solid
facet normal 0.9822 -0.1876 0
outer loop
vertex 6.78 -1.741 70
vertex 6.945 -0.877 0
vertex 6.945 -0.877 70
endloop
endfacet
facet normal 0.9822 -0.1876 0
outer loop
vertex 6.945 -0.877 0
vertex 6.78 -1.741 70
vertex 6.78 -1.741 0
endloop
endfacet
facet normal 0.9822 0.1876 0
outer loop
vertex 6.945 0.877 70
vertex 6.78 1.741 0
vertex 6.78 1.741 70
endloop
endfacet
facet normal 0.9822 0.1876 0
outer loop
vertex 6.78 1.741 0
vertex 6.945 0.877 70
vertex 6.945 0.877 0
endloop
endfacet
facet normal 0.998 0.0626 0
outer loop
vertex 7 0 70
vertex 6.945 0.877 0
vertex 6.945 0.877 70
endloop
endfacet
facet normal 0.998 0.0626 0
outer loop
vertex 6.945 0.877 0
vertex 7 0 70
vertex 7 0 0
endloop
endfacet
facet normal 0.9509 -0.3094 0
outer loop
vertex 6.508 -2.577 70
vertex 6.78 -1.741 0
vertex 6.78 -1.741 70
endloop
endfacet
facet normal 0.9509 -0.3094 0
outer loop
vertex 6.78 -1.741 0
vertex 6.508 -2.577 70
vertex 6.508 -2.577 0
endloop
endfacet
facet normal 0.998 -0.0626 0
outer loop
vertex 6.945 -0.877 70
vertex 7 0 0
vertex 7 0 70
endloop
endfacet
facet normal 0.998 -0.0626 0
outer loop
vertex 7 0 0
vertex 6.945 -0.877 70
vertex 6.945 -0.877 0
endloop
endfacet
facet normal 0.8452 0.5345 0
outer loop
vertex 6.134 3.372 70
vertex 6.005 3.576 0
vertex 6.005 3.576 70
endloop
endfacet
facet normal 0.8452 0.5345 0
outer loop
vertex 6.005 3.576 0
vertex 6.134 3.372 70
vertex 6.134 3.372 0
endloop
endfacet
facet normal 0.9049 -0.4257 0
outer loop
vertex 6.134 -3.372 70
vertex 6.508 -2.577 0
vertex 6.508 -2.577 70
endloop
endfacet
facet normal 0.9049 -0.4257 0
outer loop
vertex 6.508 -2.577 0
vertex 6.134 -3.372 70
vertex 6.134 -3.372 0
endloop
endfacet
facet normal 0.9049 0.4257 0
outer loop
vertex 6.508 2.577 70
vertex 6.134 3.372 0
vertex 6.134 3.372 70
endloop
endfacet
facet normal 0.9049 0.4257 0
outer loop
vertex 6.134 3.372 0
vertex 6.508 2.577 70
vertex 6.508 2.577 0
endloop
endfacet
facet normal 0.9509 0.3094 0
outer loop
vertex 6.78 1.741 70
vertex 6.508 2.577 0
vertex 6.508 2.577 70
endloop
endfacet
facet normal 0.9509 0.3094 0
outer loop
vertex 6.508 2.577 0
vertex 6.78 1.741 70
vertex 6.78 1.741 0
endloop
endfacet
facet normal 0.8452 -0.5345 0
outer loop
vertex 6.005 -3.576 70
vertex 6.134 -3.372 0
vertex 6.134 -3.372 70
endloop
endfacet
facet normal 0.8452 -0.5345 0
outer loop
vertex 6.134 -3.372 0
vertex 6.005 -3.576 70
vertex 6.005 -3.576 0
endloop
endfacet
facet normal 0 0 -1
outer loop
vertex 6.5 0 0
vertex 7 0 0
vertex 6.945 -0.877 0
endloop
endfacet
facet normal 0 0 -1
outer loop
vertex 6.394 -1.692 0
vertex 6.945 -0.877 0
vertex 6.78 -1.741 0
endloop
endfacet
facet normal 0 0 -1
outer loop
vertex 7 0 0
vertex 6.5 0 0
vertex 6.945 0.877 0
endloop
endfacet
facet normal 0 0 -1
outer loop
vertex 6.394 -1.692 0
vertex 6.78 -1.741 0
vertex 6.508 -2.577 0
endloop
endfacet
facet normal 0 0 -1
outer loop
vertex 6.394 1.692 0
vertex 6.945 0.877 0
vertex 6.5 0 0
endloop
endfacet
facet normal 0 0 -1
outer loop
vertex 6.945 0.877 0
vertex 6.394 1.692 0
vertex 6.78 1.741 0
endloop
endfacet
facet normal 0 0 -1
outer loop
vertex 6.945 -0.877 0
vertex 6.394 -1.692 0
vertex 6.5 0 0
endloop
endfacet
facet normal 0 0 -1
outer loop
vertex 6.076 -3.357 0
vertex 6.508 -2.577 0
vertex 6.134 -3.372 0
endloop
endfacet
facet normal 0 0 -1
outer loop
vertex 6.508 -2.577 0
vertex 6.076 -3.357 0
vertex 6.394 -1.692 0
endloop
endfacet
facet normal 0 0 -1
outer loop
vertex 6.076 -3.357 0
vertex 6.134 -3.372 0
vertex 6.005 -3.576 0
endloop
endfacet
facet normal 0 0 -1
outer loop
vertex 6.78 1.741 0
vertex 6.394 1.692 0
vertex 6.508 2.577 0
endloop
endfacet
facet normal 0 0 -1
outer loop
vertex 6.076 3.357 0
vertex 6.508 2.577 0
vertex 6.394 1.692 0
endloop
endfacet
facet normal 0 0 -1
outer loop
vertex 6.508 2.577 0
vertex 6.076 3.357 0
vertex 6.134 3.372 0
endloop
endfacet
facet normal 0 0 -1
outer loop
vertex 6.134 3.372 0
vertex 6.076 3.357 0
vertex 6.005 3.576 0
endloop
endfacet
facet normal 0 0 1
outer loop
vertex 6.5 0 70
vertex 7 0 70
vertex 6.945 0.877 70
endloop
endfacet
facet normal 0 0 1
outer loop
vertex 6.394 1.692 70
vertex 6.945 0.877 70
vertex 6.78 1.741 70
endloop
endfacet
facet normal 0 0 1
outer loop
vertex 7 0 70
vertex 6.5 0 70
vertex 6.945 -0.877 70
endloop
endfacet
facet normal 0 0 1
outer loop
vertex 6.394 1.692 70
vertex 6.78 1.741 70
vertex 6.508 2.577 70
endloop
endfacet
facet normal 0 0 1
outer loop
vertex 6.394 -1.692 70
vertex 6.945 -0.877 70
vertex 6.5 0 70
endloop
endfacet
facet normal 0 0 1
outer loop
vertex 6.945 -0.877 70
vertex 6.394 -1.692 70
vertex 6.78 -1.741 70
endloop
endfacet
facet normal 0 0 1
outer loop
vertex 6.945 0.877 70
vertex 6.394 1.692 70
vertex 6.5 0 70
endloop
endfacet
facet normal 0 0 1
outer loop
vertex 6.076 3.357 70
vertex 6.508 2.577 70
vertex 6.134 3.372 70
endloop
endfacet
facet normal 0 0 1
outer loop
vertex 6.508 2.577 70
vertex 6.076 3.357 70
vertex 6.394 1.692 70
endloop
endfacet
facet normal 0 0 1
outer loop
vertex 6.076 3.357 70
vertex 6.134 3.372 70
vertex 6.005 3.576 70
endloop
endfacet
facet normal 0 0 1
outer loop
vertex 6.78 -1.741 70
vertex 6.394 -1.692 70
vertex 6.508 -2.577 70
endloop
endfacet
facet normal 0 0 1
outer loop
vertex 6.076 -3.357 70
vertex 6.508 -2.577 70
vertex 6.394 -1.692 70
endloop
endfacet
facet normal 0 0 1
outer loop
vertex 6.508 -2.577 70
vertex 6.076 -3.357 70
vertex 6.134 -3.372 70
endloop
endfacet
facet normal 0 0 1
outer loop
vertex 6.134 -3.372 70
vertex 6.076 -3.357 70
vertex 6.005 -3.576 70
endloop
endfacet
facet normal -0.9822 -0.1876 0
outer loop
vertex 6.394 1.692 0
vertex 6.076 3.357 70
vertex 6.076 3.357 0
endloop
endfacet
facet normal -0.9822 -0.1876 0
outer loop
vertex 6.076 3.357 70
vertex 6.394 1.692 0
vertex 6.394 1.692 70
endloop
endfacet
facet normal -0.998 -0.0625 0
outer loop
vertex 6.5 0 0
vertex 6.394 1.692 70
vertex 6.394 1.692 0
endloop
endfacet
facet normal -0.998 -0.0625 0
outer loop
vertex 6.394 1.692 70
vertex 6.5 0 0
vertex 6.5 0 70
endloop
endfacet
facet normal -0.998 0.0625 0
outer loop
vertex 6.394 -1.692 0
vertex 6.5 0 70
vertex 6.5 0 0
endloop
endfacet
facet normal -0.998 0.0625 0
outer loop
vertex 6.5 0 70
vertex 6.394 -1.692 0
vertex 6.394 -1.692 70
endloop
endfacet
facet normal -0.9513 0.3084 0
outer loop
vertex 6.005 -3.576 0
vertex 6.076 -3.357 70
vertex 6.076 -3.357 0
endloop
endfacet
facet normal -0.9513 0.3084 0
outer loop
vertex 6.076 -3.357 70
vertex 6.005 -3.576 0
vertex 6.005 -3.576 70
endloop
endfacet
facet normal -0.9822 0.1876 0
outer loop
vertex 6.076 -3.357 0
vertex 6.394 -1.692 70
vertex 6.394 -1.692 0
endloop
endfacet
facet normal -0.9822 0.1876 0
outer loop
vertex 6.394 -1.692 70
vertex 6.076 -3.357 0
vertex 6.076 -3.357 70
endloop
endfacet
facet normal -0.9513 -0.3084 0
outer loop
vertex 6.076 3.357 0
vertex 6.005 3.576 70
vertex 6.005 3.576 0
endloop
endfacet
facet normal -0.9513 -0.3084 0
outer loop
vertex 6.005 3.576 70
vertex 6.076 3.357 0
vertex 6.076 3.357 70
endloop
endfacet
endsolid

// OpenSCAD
$fn = 50;


difference() {
	union() {
		cylinder(h = 70, r = 7.0000000000);
		translate(v = [-10.0000000000, 0, 0]) {
			cylinder(h = 70, r = 7.0000000000);
		}
	}
	union() {
		cylinder(h = 70, r = 3.2500000000);
		cylinder(h = 70, r = 1.8000000000);
		cylinder(h = 70, r = 1.8000000000);
		cylinder(h = 70, r = 1.8000000000);
		translate(v = [-14.5000000000, 0, 0]) {
			hull() {
				translate(v = [-3.7500000000, 0.0000000000, 0]) {
					cylinder(h = 70, r = 10.5000000000);
				}
				translate(v = [3.7500000000, 0.0000000000, 0]) {
					cylinder(h = 70, r = 10.5000000000);
				}
				translate(v = [-3.7500000000, -0.0000000000, 0]) {
					cylinder(h = 70, r = 10.5000000000);
				}
				translate(v = [3.7500000000, -0.0000000000, 0]) {
					cylinder(h = 70, r = 10.5000000000);
				}
			}
		}
		translate(v = [-7.0000000000, 0, 0.0000000000]) {
			cylinder(h = 70, r = 13.5000000000);
		}
	}
}
